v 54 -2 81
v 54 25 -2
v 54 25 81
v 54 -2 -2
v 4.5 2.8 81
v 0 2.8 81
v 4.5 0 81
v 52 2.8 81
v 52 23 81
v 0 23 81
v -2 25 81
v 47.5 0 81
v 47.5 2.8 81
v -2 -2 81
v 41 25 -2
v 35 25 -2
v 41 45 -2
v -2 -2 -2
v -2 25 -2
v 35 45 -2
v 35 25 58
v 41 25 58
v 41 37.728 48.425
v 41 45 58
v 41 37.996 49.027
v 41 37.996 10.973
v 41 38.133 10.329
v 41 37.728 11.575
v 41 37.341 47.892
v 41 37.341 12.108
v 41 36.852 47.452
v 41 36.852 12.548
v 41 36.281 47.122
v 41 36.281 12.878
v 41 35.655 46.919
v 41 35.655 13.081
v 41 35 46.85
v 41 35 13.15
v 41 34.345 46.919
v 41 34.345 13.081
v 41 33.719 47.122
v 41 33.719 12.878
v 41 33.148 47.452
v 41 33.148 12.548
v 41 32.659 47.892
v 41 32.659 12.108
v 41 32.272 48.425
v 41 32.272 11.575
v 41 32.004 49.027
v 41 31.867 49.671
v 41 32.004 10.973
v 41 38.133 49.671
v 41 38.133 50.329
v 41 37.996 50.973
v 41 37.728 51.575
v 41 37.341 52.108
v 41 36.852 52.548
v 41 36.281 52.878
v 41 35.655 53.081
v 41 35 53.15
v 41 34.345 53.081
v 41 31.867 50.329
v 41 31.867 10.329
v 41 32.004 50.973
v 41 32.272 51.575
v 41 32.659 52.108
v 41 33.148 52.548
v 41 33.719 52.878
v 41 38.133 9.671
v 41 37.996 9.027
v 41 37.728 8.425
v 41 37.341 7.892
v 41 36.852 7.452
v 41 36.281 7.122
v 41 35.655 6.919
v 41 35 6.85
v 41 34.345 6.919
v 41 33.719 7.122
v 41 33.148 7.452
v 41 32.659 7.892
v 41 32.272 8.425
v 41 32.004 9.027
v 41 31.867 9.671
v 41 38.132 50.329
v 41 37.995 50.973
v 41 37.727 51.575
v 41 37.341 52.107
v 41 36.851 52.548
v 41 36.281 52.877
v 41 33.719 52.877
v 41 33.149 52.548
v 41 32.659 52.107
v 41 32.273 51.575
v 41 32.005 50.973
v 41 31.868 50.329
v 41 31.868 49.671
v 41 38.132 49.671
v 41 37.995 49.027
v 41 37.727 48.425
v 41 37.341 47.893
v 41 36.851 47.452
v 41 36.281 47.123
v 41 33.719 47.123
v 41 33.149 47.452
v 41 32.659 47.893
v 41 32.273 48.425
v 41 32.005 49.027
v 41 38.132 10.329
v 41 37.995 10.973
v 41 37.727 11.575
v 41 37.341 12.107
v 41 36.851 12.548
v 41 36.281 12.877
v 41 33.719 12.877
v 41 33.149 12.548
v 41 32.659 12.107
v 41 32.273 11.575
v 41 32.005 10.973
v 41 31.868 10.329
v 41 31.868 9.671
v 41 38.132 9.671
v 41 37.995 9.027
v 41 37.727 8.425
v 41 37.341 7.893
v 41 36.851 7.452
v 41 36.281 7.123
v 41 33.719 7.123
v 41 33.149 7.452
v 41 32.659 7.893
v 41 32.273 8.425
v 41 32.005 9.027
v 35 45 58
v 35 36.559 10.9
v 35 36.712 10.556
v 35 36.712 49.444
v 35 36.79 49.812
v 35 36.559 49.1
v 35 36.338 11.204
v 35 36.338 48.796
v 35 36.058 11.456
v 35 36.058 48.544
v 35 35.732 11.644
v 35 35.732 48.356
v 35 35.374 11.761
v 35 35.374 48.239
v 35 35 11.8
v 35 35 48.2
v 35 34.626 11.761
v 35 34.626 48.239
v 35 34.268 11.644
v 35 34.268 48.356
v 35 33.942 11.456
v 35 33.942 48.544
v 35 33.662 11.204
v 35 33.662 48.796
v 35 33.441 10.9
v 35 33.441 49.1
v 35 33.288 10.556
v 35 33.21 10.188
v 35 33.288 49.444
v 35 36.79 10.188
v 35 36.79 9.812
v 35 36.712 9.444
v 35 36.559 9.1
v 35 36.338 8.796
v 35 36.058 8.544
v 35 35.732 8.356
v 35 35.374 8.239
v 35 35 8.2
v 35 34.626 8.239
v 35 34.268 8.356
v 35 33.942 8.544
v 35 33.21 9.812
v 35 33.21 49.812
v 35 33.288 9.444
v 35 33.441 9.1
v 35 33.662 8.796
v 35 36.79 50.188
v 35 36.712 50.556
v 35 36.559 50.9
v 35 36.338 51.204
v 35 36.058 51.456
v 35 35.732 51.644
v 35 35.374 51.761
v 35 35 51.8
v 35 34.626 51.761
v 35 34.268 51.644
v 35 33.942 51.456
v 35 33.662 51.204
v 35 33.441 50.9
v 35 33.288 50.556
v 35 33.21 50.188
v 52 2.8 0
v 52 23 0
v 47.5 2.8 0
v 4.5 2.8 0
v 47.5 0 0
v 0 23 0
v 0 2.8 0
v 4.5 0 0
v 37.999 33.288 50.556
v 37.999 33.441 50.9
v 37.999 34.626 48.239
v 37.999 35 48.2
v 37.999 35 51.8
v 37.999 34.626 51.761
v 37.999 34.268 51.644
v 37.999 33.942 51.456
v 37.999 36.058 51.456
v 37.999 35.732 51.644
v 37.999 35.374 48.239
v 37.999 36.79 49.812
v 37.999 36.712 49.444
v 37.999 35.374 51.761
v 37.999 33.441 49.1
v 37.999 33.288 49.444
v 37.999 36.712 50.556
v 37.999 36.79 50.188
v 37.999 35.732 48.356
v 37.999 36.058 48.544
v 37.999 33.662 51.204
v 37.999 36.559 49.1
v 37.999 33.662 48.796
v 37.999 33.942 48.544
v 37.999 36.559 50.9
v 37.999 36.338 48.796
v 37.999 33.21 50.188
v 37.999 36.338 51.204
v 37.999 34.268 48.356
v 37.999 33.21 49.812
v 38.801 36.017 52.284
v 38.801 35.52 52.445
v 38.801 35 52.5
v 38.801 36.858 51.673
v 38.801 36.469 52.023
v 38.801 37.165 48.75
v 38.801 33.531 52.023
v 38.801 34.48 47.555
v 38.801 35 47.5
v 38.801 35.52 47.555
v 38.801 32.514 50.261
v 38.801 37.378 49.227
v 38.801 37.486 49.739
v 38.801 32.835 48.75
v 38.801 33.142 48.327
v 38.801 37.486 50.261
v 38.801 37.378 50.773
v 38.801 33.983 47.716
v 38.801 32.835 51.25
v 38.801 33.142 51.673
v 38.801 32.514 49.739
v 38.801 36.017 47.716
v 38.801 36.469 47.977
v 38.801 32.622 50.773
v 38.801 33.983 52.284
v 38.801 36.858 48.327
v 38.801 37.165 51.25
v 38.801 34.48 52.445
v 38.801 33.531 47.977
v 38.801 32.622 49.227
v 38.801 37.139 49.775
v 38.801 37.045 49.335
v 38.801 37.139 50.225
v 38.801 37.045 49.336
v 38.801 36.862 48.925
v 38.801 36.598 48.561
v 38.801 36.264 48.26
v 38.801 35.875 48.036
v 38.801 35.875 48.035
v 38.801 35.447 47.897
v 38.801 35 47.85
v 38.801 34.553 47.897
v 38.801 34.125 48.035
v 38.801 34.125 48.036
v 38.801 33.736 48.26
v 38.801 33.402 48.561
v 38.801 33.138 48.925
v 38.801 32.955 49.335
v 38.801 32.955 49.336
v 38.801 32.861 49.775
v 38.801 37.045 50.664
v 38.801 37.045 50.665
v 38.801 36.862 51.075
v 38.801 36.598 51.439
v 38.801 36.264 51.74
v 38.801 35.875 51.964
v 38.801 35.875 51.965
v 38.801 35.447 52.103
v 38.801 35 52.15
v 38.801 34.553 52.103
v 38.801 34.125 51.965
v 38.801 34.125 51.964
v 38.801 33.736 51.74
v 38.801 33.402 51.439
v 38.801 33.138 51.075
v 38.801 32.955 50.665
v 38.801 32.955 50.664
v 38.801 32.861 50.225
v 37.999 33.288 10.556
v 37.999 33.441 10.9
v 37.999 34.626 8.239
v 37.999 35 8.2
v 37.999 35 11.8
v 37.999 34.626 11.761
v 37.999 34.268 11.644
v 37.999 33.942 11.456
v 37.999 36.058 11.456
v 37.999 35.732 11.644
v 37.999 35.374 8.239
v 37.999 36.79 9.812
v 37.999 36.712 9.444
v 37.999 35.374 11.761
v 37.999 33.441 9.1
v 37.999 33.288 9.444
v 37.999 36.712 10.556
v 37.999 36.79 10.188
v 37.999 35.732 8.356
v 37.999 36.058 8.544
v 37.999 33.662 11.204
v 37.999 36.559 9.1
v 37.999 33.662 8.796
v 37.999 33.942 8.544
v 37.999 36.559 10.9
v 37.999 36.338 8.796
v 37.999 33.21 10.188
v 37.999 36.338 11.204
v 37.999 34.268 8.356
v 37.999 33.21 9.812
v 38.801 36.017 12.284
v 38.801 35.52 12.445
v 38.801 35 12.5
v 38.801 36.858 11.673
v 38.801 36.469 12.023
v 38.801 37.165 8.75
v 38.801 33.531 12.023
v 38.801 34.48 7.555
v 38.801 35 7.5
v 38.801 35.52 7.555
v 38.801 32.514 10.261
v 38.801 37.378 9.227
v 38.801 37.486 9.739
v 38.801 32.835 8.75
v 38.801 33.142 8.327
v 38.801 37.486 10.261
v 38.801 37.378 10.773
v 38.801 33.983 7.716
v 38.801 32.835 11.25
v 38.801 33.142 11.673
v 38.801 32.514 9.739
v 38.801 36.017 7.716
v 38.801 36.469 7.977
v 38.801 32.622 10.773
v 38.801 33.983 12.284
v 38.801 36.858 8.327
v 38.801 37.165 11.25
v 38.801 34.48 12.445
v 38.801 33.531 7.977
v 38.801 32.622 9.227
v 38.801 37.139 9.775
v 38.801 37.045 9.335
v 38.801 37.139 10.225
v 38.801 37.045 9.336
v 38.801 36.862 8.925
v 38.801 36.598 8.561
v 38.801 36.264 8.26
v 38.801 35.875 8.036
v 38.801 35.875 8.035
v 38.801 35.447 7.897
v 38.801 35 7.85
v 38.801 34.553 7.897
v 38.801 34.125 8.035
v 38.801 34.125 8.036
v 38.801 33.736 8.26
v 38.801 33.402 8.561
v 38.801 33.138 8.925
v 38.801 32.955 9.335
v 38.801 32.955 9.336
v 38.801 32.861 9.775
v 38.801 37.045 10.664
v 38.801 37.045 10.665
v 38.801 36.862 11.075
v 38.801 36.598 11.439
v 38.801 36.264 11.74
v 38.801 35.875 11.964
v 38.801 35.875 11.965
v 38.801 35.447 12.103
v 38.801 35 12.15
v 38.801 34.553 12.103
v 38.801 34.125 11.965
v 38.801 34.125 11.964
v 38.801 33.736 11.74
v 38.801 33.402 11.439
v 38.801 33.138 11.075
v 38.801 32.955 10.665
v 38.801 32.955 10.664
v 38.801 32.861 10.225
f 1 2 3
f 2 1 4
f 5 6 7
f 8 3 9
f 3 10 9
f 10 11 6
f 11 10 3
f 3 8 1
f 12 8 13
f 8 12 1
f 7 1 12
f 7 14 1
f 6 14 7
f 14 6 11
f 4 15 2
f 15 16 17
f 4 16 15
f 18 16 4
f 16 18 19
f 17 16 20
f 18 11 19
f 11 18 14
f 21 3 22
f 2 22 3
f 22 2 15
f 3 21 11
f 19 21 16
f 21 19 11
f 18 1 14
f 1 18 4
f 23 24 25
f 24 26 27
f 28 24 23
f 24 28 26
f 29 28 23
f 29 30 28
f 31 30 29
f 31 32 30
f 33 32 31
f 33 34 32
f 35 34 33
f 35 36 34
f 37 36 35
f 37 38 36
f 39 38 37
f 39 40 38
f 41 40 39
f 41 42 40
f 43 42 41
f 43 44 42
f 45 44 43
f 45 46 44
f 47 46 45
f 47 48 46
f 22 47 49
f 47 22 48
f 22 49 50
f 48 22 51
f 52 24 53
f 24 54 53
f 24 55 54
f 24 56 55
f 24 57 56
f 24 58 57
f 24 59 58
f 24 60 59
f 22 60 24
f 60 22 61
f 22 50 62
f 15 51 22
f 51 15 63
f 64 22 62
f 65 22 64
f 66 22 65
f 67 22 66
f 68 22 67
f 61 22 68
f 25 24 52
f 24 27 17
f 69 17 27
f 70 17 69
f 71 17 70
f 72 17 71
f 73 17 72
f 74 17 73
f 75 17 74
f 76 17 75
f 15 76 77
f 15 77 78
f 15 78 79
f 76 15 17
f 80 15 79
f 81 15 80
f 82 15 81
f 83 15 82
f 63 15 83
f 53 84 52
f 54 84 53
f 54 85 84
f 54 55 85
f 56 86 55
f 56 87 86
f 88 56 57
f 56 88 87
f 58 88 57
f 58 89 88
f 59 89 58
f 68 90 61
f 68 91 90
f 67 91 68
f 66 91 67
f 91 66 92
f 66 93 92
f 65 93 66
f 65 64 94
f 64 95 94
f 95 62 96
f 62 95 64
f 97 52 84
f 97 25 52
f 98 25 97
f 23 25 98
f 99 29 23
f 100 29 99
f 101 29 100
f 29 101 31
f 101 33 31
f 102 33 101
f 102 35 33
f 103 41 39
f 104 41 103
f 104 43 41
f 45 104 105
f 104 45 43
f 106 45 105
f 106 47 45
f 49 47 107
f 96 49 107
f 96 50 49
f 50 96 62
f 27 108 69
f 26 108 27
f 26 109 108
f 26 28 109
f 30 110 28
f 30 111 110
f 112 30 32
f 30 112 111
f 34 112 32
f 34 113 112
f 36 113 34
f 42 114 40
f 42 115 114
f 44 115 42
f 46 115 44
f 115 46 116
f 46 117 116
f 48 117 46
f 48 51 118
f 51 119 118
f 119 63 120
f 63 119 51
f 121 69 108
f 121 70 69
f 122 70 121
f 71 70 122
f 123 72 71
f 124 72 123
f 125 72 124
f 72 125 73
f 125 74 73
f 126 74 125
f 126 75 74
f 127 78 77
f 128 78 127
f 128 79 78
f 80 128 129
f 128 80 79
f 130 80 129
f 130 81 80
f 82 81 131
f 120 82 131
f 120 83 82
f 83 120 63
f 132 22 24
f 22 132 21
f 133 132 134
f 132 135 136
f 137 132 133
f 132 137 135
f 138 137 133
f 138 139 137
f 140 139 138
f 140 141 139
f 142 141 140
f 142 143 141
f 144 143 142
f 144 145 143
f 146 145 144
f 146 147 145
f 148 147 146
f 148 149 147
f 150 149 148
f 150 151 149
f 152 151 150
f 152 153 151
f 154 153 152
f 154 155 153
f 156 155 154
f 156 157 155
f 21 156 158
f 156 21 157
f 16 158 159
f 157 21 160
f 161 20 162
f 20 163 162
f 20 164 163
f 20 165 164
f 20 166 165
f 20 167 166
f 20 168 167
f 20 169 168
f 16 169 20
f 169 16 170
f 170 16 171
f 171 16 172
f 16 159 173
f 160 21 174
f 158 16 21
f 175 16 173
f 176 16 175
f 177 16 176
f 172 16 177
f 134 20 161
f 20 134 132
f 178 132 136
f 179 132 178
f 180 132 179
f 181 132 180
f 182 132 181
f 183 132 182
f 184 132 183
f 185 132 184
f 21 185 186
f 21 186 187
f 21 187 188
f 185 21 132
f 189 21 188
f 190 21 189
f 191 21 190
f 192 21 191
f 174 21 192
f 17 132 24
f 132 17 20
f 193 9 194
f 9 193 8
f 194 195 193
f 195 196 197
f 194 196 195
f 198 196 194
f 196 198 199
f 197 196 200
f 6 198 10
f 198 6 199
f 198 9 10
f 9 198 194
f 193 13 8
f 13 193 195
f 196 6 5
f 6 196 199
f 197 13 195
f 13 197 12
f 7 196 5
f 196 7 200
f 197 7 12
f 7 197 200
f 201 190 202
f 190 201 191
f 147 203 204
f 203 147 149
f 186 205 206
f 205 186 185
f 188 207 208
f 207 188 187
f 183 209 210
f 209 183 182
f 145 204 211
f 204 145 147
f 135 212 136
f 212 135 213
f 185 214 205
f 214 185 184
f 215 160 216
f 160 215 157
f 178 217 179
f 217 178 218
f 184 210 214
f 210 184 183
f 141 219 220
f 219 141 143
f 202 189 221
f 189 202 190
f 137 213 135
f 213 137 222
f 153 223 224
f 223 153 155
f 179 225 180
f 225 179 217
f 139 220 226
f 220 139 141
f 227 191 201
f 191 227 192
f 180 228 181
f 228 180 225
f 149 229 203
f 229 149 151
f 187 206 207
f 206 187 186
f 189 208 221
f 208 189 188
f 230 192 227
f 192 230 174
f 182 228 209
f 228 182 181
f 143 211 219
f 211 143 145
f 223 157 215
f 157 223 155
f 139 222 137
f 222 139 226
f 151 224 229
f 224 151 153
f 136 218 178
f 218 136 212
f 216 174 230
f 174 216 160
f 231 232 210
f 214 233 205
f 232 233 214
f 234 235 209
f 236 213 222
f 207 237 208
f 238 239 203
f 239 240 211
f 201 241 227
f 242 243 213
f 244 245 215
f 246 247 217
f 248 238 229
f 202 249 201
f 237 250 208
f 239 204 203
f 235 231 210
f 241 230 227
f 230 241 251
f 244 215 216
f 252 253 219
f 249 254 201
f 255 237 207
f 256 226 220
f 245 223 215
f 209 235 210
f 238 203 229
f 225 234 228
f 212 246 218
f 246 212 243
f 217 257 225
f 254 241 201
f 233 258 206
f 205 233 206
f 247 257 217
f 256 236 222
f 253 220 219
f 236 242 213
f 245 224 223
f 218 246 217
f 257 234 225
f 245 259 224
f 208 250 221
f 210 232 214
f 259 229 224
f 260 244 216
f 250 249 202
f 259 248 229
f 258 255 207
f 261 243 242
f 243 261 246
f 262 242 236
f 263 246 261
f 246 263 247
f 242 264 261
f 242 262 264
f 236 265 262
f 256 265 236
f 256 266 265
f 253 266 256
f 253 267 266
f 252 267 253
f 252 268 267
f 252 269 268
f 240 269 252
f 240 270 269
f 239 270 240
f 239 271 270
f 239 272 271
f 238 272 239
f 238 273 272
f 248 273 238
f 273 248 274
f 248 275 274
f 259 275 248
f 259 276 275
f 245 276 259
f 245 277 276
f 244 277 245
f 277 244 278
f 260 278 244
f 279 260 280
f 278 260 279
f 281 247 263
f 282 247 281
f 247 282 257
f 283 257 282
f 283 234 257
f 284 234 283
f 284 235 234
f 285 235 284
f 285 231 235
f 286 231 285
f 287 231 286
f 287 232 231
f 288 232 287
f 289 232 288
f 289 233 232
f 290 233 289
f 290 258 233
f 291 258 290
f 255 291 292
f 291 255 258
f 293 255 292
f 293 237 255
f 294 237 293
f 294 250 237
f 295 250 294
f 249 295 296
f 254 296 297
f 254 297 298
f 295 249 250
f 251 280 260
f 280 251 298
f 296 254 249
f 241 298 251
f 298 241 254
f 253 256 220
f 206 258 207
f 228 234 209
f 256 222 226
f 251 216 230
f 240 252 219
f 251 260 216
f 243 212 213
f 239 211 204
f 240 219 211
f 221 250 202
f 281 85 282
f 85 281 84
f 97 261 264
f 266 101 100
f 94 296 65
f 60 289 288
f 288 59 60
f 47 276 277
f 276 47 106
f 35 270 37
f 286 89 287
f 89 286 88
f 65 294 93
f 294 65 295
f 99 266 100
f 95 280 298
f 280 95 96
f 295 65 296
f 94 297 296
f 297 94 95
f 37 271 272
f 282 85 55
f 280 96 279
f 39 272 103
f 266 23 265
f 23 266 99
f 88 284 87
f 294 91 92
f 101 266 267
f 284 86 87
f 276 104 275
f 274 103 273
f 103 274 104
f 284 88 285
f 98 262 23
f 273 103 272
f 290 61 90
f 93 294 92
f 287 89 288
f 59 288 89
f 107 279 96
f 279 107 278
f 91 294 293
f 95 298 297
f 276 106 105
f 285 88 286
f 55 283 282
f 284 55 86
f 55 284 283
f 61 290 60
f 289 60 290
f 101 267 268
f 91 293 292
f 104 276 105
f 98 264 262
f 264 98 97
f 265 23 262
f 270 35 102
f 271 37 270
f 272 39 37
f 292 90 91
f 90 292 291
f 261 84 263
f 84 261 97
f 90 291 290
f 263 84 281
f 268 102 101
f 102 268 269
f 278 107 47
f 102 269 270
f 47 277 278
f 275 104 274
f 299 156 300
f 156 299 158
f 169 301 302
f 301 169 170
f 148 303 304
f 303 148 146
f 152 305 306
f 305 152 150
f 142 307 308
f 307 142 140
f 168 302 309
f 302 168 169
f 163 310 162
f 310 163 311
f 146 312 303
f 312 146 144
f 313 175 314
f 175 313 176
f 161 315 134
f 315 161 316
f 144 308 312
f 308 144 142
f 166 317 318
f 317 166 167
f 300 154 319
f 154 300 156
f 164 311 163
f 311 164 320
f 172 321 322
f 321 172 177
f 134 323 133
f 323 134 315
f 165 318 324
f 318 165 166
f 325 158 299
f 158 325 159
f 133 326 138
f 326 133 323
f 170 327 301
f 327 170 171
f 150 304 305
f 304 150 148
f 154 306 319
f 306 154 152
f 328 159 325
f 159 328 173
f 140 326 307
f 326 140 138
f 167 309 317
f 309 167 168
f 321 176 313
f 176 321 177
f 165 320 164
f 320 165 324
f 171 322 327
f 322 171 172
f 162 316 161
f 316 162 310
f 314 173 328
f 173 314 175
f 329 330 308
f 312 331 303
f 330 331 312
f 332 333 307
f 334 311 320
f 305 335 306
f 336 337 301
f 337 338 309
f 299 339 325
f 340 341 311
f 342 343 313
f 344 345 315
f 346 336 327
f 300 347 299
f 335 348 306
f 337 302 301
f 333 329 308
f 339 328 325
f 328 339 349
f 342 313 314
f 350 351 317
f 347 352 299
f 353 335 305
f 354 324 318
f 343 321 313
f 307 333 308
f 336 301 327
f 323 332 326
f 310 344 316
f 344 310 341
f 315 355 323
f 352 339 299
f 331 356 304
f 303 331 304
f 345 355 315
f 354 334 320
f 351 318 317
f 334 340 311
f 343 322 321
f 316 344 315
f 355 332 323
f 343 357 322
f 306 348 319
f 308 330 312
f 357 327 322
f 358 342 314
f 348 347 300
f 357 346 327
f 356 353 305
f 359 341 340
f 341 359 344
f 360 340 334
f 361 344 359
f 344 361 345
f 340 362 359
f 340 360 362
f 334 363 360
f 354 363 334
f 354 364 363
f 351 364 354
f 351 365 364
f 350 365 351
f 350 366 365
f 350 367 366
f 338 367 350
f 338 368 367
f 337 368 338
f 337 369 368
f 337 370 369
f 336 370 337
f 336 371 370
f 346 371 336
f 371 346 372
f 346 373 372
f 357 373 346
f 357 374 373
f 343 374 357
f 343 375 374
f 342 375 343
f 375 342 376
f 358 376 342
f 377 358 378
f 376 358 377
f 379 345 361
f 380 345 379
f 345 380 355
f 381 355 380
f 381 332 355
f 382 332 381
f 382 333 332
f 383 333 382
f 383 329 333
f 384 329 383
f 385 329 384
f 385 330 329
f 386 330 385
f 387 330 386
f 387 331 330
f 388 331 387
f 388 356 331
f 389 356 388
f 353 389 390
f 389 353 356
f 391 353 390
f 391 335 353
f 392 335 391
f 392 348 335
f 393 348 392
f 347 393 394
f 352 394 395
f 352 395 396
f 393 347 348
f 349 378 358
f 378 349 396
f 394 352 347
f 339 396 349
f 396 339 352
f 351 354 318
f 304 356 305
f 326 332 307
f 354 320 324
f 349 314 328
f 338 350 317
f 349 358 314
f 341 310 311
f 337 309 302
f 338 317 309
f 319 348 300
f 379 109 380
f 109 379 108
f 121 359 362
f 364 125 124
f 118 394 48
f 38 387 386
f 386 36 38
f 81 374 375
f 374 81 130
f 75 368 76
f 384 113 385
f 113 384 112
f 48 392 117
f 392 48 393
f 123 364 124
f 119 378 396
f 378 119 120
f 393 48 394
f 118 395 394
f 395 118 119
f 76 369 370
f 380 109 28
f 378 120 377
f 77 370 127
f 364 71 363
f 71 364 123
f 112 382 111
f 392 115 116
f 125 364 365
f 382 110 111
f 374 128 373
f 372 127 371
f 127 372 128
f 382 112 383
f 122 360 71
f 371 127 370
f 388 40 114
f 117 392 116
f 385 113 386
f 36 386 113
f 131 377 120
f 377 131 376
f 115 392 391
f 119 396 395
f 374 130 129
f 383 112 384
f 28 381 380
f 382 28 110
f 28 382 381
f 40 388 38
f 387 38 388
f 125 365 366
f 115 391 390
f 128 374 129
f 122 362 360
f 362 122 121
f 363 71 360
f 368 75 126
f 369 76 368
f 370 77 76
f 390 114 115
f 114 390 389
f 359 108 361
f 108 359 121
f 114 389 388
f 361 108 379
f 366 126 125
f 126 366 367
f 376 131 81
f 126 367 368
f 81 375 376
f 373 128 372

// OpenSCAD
//
// ktRack27
//
//


gap1 = 0.001;
gap2 = 0.002;

th = 2;



A();
//B();
//UNIT();


module A()
difference()
{
    union()
    {
        translate([-th, -th, -th]) cube([52+th*2, 23+th*2, 81+th]);
        translate([37-th, 23+th, -th]) cube([6, 20, 60]);
    }

    UNIT();
    
    translate([41, 35, 50]) rotate([0, -90, 0]) rear_screw_hole();
    translate([41, 35, 10]) rotate([0, -90, 0]) rear_screw_hole();
    
}


module B()
translate([0, 0, 81])
difference()
{
    union()
    {
        translate([-th, -th, 0]) cube([52+th*2, 23+th*2, 28]);
        translate([37-th, 23+th, 0]) cube([6, 20, 28]);
    }
    translate([0, -17, 0]) rotate([0, 90, 0]) cylinder(h=200, r=40, center=true, $fn=100);
    translate([-30, -10, 0]) cube([100, 20, 100]);

    translate([41, 35, 22]) rotate([0, -90, 0]) rear_screw_hole();
    translate([41, 35,  7]) rotate([0, -90, 0]) rear_screw_hole();
}



module UNIT()
{
difference()
{
    union()
    {
        translate([0, 23-20.2, 0]) cube([52, 20.2, 107]);
        translate([(52-43)/2, 0, 0]) cube([43, 23, 107]);
    }
}
}



module rear_screw_hole()
{
    translate([0, 0, 3]) cylinder(5, 1.8, 1.8, $fn=30);
    translate([0, 0, 2.2-gap1]) cylinder(0.8+gap2, 1.8+0.7, 1.8, $fn=30);
    translate([0, 0, -gap1]) cylinder(2.2+gap1, 2.75+0.4, 2.75-0.6, $fn=30);
    translate([0, 0, -10]) cylinder(10, 2.75+0.4, 2.75+0.4, $fn=30);
}
